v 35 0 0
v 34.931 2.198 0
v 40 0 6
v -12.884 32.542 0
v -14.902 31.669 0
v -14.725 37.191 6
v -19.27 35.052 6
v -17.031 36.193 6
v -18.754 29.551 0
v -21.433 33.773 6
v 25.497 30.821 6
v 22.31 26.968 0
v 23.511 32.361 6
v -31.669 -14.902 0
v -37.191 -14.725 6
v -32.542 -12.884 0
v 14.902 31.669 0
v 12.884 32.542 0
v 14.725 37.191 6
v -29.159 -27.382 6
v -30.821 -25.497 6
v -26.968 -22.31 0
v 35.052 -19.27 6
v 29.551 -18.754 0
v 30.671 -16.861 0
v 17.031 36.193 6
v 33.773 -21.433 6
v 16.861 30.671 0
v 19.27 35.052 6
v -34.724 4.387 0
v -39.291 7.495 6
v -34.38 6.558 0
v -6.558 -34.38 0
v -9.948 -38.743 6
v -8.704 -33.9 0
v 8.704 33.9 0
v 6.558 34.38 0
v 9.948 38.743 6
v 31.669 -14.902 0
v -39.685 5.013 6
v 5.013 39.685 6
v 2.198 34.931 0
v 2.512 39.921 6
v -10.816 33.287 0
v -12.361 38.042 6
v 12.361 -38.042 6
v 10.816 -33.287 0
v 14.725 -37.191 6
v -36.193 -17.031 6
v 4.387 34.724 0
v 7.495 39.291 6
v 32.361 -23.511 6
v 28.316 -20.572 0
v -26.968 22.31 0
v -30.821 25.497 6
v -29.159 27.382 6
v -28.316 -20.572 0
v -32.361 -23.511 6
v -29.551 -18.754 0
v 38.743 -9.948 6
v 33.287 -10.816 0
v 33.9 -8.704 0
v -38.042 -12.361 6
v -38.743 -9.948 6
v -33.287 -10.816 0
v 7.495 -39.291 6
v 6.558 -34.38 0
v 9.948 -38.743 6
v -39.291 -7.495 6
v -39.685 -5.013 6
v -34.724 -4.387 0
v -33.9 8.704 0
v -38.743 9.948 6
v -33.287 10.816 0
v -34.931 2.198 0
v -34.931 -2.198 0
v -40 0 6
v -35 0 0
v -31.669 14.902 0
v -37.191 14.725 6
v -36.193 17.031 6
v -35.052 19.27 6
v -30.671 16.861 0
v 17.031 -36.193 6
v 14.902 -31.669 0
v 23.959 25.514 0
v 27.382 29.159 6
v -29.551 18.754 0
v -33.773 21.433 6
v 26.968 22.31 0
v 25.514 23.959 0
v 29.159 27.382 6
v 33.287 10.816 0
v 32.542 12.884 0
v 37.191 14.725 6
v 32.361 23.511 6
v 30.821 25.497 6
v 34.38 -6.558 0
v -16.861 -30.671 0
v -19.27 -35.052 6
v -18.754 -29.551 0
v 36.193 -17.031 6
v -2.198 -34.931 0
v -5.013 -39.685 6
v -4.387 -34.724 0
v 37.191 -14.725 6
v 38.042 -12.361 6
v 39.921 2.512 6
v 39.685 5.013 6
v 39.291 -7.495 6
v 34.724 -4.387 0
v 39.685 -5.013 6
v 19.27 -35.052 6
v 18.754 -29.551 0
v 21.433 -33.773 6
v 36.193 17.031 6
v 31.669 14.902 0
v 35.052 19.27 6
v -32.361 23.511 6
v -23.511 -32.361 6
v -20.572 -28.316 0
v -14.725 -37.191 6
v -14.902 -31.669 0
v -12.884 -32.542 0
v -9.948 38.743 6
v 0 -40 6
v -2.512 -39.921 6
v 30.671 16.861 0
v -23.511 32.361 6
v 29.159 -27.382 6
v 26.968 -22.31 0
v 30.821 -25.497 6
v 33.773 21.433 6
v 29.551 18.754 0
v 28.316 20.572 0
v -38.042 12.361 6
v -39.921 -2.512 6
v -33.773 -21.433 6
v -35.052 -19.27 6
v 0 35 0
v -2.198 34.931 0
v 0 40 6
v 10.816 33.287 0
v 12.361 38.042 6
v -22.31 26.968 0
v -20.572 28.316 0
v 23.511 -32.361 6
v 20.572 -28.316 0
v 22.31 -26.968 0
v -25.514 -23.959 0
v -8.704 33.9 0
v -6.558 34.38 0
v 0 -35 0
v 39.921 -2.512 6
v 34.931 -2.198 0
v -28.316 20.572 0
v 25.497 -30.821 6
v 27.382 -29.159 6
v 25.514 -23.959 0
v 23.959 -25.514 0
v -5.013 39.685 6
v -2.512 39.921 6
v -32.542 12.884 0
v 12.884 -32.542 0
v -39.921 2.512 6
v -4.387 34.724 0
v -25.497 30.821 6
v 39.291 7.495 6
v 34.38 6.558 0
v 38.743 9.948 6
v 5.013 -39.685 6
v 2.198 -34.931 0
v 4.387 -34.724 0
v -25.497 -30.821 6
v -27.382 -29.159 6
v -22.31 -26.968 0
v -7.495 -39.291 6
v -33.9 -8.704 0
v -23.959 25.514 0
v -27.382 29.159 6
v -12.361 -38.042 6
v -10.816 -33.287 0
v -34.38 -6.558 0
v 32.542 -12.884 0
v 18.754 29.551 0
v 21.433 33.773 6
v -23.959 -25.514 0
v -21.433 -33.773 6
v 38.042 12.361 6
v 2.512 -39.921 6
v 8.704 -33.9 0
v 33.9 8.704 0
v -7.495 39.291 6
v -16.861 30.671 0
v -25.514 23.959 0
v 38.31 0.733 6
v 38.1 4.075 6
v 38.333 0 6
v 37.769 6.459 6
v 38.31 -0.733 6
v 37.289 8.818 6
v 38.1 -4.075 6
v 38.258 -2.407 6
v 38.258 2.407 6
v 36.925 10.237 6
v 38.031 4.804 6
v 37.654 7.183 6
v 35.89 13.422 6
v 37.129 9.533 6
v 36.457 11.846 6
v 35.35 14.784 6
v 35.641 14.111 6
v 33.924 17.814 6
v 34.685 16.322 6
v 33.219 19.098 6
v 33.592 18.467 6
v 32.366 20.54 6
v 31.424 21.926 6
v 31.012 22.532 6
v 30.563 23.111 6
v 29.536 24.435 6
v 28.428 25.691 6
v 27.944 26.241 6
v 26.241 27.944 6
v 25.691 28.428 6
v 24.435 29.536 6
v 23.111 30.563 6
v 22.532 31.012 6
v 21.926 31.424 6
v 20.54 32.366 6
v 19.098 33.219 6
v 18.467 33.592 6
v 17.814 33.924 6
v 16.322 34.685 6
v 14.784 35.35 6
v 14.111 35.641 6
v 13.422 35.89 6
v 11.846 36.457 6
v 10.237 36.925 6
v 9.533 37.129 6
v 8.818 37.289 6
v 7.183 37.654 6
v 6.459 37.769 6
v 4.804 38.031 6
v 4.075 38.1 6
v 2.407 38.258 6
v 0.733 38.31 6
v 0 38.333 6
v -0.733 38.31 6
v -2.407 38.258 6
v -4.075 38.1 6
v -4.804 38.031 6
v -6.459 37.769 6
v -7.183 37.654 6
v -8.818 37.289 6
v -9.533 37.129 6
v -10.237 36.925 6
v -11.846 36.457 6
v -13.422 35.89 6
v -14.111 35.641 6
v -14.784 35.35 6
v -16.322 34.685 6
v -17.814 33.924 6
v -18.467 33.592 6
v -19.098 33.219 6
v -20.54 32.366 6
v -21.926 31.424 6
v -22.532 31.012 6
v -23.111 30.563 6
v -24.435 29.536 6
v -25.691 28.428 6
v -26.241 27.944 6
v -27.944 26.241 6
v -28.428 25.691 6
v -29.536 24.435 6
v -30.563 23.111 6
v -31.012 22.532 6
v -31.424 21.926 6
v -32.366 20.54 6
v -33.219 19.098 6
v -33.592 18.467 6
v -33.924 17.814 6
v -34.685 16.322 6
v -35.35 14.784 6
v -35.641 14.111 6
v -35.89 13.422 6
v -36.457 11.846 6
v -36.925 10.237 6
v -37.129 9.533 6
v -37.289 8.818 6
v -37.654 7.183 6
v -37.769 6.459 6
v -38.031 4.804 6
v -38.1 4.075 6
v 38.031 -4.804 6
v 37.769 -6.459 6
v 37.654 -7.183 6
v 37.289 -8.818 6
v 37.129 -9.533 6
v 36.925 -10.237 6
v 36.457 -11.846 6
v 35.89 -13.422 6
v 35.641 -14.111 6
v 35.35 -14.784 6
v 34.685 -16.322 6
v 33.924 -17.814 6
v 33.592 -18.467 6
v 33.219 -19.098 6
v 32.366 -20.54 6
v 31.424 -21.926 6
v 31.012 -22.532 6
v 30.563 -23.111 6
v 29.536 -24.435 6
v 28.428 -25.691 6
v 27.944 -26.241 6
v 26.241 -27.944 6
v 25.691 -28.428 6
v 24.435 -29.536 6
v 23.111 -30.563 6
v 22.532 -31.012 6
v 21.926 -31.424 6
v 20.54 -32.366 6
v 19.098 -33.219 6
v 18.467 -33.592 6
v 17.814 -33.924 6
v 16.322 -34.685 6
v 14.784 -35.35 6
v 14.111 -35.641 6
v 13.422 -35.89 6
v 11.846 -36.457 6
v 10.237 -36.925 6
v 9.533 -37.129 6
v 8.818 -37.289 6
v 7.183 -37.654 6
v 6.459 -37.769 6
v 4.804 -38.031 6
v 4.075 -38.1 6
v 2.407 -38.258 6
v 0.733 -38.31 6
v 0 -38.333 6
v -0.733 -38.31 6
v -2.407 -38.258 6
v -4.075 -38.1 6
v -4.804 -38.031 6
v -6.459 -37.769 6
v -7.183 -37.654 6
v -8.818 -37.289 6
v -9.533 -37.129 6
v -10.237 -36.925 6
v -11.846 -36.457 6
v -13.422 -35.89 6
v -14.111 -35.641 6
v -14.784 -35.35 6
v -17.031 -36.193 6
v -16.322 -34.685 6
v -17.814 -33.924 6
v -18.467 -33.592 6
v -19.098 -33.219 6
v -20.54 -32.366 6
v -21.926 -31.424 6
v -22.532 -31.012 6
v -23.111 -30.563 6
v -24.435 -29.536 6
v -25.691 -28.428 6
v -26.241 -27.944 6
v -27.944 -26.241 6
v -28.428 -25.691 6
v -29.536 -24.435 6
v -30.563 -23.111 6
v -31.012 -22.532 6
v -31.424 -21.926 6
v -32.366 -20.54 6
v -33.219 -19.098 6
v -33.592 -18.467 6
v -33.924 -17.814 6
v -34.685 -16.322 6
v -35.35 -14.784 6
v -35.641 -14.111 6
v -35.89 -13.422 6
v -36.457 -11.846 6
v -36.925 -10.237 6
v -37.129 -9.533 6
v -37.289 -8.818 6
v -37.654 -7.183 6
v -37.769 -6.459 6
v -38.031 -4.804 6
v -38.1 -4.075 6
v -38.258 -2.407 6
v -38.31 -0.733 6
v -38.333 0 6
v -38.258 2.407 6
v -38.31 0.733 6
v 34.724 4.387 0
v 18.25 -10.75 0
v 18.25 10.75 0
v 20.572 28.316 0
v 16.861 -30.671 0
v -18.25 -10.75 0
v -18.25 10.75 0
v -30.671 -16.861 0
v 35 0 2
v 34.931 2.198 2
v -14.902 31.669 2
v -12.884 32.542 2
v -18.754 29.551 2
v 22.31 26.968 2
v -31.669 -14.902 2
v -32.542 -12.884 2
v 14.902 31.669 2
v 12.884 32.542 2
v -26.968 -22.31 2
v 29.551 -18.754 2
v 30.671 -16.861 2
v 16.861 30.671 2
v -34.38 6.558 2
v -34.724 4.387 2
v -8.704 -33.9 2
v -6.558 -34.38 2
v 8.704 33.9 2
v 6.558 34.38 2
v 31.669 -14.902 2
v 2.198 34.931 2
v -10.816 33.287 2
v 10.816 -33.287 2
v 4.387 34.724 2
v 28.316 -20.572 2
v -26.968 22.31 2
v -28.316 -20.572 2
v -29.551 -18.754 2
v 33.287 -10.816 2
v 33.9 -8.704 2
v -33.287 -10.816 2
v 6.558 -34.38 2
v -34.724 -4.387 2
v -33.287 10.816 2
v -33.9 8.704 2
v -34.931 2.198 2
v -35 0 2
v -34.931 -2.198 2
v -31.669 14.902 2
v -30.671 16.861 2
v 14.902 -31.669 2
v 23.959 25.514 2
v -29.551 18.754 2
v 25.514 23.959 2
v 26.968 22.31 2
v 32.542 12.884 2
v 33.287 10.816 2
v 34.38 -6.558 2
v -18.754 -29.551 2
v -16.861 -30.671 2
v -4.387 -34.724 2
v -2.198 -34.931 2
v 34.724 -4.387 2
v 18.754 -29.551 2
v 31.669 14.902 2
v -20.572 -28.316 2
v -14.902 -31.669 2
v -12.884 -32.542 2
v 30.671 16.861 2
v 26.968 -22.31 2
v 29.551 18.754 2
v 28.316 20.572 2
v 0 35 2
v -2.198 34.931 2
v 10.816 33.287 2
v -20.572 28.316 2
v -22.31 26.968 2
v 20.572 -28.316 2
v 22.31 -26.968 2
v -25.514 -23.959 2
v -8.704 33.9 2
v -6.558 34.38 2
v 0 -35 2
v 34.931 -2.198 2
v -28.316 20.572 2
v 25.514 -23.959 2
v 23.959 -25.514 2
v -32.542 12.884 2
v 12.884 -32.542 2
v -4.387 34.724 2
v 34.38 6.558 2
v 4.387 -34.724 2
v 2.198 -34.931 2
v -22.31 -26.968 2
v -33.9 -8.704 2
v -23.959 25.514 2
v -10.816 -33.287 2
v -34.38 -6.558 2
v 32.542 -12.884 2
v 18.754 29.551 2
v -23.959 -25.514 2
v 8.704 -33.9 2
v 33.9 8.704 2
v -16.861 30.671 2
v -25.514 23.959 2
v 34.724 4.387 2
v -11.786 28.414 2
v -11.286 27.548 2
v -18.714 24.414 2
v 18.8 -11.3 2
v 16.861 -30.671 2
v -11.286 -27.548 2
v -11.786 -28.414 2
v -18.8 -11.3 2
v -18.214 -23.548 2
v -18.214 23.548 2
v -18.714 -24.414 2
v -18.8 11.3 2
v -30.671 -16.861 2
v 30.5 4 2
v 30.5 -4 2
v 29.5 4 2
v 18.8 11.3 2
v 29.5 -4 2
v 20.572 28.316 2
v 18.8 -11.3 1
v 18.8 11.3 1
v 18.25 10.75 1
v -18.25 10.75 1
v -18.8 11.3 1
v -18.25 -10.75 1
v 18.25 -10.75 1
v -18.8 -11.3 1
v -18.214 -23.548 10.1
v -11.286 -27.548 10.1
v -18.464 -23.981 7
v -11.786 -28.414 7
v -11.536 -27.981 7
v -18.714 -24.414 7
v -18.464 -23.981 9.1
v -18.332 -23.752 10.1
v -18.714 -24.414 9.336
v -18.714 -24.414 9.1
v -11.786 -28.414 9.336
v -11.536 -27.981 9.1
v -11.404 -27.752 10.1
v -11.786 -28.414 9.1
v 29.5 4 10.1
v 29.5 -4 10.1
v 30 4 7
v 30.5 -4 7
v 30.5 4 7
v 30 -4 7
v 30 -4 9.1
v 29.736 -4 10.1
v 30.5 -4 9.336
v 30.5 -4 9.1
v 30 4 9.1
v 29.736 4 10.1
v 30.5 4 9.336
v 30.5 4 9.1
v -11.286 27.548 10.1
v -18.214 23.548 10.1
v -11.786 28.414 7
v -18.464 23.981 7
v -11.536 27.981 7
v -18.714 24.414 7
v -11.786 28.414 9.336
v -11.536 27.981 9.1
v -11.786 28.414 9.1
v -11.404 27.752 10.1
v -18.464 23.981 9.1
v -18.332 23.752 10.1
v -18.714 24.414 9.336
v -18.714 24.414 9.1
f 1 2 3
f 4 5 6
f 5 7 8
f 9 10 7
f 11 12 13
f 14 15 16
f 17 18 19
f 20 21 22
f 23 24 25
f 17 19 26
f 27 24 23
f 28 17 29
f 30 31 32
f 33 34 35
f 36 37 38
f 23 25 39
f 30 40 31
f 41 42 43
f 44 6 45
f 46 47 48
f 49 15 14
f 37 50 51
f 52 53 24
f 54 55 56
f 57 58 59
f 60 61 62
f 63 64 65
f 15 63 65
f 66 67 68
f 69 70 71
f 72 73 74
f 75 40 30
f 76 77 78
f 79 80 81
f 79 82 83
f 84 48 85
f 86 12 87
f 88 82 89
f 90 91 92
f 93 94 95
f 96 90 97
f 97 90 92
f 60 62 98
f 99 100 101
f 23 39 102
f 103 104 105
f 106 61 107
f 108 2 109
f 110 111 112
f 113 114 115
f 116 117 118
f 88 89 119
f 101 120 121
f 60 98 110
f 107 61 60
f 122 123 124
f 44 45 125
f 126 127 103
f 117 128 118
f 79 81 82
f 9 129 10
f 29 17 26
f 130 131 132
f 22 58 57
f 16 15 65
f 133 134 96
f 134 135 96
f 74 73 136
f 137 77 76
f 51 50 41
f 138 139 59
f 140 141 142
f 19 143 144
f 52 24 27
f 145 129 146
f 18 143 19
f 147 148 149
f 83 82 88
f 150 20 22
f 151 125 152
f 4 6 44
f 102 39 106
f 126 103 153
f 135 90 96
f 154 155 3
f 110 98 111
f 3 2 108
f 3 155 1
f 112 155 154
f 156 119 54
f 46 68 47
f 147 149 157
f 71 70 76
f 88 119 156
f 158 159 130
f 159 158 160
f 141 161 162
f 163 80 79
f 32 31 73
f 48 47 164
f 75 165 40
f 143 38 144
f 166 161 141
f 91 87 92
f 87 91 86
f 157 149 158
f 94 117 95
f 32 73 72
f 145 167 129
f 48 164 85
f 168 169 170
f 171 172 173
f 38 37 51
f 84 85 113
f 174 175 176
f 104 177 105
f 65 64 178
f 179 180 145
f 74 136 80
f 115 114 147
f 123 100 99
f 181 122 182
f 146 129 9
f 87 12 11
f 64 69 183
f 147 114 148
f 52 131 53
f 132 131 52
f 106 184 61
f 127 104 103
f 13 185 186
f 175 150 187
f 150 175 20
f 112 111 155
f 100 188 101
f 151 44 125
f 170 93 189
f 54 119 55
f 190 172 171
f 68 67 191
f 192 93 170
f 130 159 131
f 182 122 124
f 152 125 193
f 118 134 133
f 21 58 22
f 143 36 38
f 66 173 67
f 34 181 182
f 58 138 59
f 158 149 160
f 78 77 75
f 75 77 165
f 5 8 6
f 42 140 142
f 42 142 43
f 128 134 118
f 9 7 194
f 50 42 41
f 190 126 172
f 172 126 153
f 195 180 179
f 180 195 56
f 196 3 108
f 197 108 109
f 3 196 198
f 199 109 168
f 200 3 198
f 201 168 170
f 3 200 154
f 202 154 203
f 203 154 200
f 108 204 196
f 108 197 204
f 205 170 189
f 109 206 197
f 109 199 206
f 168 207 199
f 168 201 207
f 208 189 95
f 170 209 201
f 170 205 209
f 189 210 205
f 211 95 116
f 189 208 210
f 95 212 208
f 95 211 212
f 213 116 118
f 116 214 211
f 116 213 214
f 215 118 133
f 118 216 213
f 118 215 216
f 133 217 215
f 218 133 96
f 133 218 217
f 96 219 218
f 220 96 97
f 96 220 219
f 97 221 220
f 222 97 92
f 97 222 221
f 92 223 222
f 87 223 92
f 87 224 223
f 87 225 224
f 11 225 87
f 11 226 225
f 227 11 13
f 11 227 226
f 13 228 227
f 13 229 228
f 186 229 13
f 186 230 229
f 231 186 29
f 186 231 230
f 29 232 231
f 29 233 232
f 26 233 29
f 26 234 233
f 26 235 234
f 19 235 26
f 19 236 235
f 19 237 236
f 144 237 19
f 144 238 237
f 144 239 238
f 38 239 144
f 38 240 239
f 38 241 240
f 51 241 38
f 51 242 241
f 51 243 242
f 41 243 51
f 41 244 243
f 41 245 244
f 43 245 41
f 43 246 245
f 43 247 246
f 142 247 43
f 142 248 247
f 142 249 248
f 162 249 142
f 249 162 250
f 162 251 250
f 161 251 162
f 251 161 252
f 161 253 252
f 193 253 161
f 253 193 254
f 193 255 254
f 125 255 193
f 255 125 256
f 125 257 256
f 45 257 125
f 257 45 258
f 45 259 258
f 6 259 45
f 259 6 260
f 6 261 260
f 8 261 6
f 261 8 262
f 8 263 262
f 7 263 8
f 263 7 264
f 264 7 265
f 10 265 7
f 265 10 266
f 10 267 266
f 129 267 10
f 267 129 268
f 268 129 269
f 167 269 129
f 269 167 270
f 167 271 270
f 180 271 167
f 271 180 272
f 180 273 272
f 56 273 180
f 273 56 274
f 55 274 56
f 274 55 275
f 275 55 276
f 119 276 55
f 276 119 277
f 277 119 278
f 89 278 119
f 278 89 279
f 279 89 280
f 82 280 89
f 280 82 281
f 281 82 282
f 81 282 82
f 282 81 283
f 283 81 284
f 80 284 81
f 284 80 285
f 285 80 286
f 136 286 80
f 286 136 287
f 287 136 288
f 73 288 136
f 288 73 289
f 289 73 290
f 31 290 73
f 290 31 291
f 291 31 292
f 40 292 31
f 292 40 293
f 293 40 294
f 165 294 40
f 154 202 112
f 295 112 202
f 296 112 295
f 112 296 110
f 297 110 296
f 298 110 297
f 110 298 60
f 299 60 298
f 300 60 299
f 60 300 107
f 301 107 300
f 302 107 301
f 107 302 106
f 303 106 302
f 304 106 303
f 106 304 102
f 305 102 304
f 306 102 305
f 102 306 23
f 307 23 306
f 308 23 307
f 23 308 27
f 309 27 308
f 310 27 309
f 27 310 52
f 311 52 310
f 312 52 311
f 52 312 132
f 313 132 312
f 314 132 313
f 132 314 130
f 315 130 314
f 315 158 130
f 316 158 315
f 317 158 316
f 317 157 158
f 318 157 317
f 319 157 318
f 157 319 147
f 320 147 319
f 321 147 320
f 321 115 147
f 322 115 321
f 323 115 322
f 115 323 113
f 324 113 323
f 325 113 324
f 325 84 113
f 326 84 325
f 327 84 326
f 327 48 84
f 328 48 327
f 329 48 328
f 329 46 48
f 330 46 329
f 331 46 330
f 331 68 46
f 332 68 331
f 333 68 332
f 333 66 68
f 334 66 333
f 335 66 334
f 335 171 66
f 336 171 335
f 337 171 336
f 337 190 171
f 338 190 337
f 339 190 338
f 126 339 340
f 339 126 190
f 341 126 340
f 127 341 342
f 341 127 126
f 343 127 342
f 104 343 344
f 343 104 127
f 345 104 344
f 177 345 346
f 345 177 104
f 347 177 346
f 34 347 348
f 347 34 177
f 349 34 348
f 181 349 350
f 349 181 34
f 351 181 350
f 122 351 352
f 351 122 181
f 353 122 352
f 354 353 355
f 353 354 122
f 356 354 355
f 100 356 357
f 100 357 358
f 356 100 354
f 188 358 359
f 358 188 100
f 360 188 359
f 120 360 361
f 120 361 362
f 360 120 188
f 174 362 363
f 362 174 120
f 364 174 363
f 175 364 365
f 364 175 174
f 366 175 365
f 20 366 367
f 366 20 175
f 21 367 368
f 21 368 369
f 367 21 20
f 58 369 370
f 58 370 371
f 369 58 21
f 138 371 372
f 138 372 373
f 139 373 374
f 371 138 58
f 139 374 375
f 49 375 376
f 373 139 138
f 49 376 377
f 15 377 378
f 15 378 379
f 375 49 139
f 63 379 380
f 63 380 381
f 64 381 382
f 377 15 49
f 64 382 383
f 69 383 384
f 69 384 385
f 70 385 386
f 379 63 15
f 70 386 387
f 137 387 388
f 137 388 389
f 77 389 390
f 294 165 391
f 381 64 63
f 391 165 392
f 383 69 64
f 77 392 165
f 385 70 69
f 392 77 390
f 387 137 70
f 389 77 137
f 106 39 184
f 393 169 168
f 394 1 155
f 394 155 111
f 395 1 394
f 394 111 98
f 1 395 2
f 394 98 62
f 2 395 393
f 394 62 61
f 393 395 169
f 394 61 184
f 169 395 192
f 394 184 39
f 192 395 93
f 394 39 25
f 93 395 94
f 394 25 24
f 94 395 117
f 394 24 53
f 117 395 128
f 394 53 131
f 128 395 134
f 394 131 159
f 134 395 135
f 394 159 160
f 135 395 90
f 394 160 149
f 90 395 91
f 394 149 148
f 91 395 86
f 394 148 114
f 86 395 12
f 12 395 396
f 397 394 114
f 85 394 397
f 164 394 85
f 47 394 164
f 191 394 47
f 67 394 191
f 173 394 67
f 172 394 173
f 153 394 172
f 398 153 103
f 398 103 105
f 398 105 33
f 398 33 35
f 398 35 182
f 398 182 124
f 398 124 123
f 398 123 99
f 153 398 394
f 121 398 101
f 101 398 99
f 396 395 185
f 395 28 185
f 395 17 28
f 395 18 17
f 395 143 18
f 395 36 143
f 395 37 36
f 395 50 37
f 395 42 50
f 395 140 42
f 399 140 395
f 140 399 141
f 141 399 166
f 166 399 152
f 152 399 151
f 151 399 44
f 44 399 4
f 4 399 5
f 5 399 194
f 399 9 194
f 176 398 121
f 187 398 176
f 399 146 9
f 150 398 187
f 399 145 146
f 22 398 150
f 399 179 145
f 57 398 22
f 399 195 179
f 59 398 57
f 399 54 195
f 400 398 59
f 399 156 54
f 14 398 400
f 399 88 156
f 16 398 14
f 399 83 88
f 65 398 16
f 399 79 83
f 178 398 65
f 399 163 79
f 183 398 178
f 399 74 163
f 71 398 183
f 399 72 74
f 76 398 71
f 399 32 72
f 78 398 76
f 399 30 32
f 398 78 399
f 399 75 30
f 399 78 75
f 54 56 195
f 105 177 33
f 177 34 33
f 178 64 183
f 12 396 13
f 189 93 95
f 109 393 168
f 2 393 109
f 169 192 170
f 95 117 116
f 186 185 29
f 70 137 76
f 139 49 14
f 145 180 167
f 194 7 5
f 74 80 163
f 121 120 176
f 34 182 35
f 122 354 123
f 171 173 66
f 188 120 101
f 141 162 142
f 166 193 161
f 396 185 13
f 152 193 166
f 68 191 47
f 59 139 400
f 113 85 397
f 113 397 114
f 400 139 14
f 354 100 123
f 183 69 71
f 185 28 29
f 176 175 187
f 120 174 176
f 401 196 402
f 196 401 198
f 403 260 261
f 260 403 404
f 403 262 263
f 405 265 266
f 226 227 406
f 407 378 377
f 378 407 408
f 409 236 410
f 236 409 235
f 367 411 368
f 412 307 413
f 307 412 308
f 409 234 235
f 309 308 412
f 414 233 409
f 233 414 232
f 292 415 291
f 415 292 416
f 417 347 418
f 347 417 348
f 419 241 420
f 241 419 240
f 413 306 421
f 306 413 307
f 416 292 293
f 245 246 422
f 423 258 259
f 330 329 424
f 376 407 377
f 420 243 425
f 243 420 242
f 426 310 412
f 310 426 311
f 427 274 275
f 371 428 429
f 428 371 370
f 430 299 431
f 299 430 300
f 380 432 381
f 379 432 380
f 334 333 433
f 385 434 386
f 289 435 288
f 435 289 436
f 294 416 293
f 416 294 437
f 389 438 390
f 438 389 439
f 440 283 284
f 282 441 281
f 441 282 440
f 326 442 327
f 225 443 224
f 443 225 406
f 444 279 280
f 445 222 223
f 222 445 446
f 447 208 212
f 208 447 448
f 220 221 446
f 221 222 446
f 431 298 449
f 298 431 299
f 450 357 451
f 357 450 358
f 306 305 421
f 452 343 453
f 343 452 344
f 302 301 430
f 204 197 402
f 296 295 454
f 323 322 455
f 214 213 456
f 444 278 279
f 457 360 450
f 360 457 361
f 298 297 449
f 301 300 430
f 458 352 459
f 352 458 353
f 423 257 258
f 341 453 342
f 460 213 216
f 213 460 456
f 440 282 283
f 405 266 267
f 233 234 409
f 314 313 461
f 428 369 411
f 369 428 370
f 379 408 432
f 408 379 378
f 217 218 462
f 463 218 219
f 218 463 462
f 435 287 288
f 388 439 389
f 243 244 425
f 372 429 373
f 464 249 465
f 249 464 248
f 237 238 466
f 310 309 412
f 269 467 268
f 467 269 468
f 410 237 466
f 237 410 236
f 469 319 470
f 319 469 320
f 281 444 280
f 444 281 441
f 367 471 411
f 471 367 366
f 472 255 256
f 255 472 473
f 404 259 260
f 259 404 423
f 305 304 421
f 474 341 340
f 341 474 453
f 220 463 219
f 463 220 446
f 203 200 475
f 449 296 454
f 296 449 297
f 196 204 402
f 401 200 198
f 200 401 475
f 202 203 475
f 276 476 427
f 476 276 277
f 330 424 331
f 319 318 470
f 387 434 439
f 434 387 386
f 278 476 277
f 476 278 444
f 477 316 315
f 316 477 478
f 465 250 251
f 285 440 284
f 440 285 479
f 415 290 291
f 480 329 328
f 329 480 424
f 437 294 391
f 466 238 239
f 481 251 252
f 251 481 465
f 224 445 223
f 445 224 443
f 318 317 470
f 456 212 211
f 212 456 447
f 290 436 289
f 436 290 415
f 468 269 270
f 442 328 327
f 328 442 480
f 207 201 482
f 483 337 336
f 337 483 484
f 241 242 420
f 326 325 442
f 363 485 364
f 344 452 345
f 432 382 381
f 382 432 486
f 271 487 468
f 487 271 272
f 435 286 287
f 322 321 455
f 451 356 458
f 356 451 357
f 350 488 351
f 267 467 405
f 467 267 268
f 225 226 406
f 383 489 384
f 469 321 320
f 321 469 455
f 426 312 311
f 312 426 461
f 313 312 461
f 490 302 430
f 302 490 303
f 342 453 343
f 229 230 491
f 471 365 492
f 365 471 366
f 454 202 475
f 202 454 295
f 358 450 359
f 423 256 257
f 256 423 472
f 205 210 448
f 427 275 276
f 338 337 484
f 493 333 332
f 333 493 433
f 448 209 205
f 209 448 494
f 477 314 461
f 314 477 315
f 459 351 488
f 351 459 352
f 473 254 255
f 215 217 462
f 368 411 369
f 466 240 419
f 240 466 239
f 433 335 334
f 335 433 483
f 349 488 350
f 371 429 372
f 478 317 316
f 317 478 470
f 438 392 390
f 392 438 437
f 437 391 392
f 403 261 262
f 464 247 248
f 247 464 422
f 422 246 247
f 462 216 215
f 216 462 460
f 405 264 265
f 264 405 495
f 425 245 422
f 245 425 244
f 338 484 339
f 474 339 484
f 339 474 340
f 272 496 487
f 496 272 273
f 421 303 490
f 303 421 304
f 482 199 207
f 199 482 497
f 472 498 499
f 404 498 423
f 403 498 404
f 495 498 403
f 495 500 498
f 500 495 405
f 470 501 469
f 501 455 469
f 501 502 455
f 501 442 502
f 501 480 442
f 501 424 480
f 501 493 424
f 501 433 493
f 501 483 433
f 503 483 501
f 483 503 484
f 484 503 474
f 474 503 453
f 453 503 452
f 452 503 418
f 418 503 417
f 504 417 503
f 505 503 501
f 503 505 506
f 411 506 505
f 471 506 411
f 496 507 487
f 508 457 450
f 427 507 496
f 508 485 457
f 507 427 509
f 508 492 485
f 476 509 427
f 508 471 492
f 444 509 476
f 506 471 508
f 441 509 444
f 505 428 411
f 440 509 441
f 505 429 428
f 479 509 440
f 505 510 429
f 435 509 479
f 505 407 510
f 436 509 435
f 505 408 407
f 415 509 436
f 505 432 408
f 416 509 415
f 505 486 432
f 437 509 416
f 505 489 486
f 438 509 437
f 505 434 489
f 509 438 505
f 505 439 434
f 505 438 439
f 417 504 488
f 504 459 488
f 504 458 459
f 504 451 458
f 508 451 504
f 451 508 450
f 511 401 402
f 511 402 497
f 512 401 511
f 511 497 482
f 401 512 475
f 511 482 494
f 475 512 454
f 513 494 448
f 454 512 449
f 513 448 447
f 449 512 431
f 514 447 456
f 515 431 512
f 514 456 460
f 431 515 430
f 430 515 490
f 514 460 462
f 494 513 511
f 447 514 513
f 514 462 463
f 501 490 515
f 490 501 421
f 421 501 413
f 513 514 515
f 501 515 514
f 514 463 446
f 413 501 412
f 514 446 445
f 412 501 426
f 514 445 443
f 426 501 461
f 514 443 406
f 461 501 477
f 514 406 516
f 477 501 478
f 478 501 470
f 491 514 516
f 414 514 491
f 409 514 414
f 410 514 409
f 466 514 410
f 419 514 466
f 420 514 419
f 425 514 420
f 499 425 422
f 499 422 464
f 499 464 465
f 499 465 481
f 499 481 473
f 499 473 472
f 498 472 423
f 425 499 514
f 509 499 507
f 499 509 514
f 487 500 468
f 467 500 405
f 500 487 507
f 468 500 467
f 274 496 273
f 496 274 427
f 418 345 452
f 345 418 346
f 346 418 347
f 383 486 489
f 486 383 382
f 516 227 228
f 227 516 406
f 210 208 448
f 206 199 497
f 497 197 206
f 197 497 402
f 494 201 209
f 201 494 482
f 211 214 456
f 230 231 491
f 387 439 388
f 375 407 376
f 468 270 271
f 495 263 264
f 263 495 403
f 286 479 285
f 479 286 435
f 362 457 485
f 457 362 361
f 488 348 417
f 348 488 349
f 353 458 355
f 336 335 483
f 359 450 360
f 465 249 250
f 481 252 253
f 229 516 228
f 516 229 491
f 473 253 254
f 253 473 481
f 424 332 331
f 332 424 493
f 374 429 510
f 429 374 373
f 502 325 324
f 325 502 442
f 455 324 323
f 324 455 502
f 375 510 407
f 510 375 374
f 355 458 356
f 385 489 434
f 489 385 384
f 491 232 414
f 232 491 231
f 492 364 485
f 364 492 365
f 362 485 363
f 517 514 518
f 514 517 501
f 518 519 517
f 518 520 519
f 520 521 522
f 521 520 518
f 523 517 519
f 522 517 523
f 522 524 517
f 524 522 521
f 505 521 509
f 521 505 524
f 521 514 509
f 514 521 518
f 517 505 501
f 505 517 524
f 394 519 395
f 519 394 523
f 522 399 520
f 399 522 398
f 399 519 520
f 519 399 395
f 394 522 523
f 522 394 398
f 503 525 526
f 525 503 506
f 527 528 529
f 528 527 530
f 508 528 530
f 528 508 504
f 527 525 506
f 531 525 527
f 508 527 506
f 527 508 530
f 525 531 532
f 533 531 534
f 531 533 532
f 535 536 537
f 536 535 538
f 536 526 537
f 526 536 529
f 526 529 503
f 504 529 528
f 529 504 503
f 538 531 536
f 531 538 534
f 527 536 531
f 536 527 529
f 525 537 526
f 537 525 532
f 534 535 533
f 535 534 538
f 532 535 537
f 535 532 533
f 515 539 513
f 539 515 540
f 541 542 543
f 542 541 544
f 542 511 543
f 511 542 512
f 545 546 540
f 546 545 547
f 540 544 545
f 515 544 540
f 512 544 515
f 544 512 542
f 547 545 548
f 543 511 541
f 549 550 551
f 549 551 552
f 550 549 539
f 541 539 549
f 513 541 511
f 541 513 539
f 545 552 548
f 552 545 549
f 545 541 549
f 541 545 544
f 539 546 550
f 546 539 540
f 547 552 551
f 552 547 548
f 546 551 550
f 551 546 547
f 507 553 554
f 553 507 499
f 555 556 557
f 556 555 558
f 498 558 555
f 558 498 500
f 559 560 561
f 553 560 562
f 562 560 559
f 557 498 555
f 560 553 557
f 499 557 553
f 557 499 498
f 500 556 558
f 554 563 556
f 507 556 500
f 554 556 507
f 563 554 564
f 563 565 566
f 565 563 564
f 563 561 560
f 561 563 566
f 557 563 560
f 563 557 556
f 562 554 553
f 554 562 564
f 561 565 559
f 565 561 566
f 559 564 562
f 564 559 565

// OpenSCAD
// file: housing.scad
width  = 22.5;
length = 29.0;
height =  1.6;

p_width  = width  + 0.25;
p_length = length + 0.25;
p_height = height + 0.15;

b_width  = width  + 2;
b_length = length;

module disc()
{
    difference()
    {
        cylinder(h=6, r1=35, r2=40, center=false, $fn=100);
        translate([0, 0, 2])
        {
            cylinder(h=6, r1=35, r2=40, center=false, $fn=100);
        }
    }
}

module supports()
{
    for(i=[0:120:360])
    {
        rotate([0, 0, i])
        {
            translate([30, 0, 2])
            {
                difference()
                {
                    cylinder(h=5, r=4, $fn=100);
                    cylinder(h=5, r=1.3, $fn=100);
                }
            }
        }
    }
}

module clippers(w=8)
{
    for(i=[60:120:360]) rotate([0, 0, i]) translate([-30, 0, 0])
    {
        translate([-0.5, -w/2, 2])
            difference()
            {
                union()
                {
                    translate([0, 0, 0]) cube([1, w, 5]);
                    translate([0.5, 0, 5]) cube([0.5, w, 2.1]);
                    translate([0, 0, 7.1]) cube([1, w, 1]);
                }
                translate([-1, 0, 7.75]) rotate([0, 45, 0]) cube([1, w, 2]);
            }
    }
}

module clipping_holes(w=8)
{
    for(i=[0:120:360]) rotate([0, 0, i])
    {
        translate([-30, 0, 0])
        {
            translate([0, -(w + 0.1)/2, 0]) cube([1.1, w + 0.1, 2.1]);
        }
    }
}

module pcb_support()
{
    difference()
    {
        translate([-(b_length)/2+1, -b_width/2, 2]) cube([b_length, b_width, 8]);
        translate([-p_length/2, -p_width/2, 5.5 + p_height])
            cube([p_length, p_width, p_height]);
        translate([-p_length/2, -(width - 1.0)/2, 2]) cube([p_length, width - 1.0, 10]);
        translate([-p_length/2, -p_width/2+1, 5.5 + p_height])
            cube([p_length-13.5, p_width+2, p_height+2]);
        translate([-p_length/2 + 1, -(width-1)/2, 9]) cube([p_length, width - 1.0, 2]);
    }

    translate([-length/2-2, width/2-1,2]) cube([2, 1, 8]);

}

module pcb()
{
    translate([-length/2, -width/2, 5.5 + height]) cube([length, width, height]);
}

module battery_support()
{
    difference()
    {
        translate([-35/2, -22/2, 2]) cube([37,22,9]);
        translate([-37/2, -20/2, 2]) cube([37,20, 8]);
        translate([-37/2, -18/2, 2]) cube([37,18,10]);
    }
}

module cable_hole()
{
    translate([-17.5, 0, 0])
    {
        cylinder(h=6, r1=10, r2=10, center=false, $fn=100);
    }
}

module solar_panel(l=37.5, w=22.5)
{
    union()
    {
        translate([-(l+0.1)/2, -(w+0.1)/2, 1]) cube([l+0.1, w+0.1, 2]);
        translate([-(l-1)/2, -(w-1)/2, 0]) cube([l-1, w-1, 1]);
    }
}
// main file
use <housing.scad>

union()
{
    difference()
    {
        disc();
        solar_panel();
    }
    clippers();
}
